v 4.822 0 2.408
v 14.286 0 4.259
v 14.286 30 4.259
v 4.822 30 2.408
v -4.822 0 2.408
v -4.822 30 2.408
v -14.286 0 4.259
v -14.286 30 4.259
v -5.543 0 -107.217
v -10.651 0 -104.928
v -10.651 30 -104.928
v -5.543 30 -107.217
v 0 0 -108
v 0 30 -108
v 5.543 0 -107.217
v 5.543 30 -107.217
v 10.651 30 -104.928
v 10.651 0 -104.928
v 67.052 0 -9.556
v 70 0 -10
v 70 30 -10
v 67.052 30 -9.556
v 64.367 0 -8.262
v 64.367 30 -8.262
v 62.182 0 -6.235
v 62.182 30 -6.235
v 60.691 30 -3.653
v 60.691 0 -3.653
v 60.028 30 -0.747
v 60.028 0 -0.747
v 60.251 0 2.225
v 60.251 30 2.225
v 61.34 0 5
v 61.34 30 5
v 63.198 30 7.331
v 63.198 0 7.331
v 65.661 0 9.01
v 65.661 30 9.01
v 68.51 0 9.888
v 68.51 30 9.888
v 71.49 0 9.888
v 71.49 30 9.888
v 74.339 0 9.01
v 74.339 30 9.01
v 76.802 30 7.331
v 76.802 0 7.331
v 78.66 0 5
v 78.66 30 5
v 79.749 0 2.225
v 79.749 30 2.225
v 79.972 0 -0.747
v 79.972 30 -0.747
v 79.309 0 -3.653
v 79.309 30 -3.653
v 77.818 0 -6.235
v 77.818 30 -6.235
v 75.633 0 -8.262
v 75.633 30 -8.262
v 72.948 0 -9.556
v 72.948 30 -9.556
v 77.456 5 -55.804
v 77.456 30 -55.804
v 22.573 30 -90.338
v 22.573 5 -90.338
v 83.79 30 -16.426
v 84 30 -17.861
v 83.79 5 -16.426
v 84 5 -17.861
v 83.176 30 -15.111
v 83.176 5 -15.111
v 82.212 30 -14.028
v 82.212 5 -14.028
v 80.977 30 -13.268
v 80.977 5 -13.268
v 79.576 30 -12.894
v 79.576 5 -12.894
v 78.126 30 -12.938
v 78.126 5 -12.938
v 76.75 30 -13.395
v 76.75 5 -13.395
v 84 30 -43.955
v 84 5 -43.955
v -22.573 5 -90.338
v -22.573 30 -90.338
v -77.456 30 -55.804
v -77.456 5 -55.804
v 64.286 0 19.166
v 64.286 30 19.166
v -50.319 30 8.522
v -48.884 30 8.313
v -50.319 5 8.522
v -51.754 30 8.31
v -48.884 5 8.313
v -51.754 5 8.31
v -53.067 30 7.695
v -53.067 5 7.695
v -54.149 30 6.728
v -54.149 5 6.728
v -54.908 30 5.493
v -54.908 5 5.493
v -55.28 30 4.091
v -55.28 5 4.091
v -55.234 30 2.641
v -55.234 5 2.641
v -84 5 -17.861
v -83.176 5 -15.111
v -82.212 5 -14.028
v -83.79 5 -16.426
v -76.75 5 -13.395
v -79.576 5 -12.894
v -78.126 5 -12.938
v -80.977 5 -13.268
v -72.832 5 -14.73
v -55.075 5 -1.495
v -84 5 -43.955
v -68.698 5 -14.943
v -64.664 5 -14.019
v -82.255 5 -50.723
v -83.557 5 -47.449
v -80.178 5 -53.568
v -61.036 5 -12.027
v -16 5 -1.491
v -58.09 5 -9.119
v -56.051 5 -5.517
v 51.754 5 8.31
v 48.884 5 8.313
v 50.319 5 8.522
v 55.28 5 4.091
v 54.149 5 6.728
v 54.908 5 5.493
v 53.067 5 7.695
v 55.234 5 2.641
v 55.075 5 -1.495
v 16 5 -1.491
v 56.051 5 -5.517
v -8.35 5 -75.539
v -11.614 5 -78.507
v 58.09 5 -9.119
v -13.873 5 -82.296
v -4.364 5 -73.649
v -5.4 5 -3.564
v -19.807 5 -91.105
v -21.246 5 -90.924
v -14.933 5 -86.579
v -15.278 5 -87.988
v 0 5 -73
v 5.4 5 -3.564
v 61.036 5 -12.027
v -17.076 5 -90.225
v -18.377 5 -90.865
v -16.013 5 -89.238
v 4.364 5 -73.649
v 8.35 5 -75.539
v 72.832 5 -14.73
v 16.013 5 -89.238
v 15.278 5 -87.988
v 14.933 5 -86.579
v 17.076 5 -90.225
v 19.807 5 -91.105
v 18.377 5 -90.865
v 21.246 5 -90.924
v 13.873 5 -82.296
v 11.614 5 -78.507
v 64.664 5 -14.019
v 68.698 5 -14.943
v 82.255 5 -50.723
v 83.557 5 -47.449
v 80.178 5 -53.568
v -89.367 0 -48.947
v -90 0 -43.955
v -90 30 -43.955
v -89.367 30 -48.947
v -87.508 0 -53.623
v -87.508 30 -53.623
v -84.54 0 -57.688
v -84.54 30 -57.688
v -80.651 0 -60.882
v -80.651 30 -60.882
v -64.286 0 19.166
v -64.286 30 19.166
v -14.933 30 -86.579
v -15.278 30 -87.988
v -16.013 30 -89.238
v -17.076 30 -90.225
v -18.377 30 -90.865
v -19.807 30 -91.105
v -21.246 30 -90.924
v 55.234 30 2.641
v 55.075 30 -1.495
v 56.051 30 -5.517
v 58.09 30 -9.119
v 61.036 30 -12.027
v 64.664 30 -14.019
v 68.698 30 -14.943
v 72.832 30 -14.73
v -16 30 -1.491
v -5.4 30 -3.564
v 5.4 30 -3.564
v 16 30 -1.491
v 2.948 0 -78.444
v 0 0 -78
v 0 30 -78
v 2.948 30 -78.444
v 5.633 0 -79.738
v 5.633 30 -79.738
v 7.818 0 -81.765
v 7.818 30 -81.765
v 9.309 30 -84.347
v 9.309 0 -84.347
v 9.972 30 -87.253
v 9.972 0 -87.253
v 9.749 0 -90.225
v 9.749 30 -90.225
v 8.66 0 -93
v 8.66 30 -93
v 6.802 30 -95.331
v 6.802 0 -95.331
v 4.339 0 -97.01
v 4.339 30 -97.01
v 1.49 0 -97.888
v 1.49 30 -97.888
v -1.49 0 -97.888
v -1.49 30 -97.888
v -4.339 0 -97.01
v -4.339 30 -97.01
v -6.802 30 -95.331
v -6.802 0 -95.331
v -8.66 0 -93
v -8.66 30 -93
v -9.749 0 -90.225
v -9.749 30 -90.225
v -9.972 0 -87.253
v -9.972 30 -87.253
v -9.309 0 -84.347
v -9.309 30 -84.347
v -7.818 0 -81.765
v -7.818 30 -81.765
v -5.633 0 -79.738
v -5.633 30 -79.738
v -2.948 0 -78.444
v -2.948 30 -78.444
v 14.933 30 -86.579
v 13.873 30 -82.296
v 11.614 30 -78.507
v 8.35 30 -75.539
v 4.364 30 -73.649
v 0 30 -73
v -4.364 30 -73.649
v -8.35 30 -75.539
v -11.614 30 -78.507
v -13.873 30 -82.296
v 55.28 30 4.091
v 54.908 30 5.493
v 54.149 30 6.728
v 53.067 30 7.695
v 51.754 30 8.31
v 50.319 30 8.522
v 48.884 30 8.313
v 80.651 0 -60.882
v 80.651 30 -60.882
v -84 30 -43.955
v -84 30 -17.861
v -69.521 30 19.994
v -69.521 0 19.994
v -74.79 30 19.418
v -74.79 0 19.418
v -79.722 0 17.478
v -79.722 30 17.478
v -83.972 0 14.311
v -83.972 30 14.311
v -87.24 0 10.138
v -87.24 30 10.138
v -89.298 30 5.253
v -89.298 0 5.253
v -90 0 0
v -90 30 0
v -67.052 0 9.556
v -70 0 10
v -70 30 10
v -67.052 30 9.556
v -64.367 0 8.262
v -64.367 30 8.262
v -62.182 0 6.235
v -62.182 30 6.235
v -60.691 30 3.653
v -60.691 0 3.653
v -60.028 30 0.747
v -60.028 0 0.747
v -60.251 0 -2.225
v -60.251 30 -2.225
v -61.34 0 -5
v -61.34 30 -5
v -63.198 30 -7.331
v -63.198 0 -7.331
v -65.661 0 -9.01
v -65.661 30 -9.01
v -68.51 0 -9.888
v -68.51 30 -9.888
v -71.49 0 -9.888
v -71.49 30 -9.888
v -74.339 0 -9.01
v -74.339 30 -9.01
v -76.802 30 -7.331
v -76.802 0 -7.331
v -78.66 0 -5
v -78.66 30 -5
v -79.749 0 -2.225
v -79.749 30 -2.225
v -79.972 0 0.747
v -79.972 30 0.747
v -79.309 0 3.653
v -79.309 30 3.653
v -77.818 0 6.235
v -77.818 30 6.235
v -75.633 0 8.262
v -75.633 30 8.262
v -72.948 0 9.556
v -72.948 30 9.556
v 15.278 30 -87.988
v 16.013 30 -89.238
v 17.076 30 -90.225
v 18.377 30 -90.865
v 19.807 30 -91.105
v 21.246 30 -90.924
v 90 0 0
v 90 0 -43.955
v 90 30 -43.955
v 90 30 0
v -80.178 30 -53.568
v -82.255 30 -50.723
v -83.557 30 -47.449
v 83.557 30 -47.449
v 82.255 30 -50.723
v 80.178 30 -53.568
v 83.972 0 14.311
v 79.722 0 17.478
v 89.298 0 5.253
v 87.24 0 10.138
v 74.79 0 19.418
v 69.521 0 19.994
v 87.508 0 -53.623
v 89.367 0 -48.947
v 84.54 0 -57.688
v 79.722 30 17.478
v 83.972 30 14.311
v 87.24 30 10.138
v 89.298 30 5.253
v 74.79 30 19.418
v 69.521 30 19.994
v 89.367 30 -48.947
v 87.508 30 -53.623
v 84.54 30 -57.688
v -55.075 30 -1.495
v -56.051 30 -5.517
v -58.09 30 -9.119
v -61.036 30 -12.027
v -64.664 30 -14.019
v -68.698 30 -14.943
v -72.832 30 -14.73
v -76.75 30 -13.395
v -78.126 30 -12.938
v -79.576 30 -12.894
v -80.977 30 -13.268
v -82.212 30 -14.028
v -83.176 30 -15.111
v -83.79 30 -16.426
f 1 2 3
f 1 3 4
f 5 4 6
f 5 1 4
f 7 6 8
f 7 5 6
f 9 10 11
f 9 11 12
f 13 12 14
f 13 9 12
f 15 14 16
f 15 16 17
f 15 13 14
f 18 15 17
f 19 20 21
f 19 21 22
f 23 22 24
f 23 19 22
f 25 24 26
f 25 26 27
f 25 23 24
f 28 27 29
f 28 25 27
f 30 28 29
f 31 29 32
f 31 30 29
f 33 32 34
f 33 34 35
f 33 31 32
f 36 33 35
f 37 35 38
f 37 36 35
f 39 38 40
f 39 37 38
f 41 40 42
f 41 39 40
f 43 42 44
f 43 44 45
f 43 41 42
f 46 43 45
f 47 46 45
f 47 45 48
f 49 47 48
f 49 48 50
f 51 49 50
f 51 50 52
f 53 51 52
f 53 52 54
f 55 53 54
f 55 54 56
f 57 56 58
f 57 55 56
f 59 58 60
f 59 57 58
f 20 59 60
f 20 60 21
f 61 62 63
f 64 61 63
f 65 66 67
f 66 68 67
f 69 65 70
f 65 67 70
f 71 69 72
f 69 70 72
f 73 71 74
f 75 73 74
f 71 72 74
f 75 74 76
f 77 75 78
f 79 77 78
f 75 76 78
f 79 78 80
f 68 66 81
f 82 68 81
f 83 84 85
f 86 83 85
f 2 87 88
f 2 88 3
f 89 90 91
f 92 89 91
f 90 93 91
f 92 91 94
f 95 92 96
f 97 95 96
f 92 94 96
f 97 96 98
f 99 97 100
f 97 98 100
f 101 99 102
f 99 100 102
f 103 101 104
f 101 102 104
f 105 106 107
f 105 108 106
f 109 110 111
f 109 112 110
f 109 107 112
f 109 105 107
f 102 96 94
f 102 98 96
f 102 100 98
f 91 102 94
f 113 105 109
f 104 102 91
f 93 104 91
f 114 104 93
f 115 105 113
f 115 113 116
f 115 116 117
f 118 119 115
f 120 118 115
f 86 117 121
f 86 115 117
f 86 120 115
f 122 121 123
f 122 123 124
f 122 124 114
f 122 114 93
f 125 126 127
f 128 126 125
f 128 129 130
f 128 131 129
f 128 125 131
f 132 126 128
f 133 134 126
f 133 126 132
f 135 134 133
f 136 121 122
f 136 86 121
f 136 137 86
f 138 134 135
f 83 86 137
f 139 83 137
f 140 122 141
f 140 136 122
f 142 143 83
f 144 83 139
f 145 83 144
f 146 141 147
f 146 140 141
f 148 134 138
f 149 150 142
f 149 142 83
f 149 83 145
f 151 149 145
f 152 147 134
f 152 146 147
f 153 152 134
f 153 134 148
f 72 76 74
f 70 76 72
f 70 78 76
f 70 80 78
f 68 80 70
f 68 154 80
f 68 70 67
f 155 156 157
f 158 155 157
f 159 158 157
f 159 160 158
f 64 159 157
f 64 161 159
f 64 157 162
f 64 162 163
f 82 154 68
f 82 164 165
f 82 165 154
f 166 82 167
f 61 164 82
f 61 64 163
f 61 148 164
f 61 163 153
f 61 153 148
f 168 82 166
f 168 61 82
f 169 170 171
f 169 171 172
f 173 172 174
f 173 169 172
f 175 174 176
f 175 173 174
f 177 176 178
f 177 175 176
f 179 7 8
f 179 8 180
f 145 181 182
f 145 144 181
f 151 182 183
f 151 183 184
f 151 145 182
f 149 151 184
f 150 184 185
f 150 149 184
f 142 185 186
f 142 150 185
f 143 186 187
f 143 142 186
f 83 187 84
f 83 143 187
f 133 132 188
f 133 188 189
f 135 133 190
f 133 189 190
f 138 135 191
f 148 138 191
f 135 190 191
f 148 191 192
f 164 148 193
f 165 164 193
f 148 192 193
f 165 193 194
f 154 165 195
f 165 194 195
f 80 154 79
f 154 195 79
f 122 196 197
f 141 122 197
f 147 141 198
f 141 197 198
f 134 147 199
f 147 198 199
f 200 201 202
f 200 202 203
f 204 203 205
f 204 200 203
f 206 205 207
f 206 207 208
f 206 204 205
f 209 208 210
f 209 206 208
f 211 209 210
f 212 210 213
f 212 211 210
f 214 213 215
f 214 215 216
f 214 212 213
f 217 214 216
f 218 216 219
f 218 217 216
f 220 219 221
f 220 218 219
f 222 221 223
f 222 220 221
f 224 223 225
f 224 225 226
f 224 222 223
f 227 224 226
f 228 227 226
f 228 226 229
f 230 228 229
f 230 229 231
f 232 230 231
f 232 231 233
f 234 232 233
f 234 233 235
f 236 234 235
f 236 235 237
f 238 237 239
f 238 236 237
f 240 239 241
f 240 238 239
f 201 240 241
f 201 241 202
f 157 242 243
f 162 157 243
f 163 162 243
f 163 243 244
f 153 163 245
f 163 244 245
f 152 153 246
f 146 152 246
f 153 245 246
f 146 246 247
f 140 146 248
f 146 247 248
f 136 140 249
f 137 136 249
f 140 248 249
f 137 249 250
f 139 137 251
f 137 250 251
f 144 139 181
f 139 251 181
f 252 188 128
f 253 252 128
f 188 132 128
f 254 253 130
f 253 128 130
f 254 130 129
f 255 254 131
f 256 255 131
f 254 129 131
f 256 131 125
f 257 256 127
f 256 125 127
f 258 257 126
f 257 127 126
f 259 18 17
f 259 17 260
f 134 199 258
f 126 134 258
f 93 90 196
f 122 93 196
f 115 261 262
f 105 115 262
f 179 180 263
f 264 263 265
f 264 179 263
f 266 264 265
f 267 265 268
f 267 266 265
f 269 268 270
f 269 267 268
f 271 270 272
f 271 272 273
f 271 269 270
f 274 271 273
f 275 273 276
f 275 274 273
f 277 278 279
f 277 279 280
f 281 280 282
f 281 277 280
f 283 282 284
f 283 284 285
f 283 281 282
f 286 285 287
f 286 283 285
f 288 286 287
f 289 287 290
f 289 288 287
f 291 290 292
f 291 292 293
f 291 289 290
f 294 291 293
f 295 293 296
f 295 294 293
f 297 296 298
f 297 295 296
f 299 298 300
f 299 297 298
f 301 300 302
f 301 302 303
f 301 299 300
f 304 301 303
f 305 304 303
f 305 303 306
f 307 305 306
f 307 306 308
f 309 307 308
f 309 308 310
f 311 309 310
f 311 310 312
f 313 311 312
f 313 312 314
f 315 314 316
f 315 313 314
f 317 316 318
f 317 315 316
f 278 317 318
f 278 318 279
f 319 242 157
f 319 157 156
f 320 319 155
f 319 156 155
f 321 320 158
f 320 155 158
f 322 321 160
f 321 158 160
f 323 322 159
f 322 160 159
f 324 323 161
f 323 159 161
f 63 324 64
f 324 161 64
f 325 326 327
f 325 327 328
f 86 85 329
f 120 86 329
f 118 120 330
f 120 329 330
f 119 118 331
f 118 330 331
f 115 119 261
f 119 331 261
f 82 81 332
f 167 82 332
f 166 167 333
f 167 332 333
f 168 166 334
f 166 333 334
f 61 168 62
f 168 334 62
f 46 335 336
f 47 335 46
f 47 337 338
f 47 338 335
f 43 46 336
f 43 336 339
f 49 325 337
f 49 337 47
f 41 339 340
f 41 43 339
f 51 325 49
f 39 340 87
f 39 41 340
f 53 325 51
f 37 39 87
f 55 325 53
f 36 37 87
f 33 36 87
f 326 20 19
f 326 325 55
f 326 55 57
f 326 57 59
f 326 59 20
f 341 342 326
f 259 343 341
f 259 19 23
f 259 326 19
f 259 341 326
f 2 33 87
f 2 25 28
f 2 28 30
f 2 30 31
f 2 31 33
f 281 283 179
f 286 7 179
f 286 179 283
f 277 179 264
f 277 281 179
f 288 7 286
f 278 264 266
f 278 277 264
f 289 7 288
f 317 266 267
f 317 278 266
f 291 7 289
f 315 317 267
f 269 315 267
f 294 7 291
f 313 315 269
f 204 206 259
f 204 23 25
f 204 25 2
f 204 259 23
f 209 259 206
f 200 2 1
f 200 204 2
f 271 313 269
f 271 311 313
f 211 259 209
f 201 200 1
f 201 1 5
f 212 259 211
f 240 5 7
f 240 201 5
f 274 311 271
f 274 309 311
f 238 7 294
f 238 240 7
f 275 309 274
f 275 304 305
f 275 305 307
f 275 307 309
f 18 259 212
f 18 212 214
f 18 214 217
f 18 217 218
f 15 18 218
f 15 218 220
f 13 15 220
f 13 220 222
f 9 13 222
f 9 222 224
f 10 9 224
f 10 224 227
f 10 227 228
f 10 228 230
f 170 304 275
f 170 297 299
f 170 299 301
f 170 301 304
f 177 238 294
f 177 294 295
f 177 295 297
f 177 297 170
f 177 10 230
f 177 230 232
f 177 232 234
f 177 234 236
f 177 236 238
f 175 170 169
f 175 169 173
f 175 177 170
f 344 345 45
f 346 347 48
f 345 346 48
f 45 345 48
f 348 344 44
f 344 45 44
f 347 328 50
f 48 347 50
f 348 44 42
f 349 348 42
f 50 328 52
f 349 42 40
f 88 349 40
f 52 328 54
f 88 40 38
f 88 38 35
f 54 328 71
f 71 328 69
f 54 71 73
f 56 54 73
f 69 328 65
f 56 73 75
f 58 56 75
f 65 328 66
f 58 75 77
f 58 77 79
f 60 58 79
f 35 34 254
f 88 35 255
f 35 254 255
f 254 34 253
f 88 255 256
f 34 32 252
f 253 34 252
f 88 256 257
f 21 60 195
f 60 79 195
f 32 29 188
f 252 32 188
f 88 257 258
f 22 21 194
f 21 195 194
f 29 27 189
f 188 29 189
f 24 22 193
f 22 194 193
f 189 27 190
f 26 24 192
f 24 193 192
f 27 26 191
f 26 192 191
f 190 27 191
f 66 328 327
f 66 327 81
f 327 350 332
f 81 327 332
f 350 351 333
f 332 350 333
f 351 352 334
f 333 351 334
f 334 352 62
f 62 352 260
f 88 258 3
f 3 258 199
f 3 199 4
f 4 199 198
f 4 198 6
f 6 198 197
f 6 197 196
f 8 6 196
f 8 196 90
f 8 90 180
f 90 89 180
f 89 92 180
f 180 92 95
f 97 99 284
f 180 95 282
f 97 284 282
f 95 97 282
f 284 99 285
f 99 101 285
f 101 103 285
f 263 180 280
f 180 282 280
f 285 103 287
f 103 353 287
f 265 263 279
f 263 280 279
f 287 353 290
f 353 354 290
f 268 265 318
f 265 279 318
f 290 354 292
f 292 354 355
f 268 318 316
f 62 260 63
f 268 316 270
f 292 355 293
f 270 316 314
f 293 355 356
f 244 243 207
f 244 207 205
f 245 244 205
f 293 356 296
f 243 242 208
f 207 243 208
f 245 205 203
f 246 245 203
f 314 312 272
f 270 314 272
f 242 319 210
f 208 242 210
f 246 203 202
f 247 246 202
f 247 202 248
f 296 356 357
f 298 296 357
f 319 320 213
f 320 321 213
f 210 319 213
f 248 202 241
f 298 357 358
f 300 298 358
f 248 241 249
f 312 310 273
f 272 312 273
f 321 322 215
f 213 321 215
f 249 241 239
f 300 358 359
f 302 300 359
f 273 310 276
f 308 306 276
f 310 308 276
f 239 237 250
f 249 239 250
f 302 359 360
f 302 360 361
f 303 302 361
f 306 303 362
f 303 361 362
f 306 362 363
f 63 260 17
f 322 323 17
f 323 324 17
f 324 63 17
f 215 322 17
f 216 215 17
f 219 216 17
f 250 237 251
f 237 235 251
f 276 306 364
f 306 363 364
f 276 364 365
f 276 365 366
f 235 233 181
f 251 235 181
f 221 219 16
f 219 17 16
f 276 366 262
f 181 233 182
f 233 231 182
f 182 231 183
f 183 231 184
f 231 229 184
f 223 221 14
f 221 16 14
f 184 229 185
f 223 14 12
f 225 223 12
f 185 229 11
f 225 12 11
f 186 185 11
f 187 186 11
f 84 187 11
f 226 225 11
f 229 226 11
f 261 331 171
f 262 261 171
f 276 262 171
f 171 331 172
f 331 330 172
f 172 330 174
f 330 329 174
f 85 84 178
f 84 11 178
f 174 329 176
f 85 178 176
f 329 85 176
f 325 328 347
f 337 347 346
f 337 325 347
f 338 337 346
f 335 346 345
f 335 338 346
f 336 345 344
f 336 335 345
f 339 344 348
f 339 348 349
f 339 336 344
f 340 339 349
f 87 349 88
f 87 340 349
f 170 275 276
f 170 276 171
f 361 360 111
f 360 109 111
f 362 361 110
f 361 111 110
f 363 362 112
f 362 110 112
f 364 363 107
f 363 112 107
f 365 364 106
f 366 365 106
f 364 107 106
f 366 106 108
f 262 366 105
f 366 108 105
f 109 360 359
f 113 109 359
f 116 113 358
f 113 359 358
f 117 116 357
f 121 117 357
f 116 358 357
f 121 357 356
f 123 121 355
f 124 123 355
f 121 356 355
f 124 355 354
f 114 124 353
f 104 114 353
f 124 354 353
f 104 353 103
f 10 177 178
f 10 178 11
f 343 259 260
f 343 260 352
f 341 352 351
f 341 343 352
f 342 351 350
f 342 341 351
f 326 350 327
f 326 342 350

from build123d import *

# Parameters (mm, degrees)
SKETCH1_R           = 10
BOSS_EXTRUDE1_DEPTH = 30
CUT_EXTRUDE1_DEPTH  = 25
FILLET1_R           = 5


with BuildPart() as part:
    # Sketch1 → Boss-Extrude1 (new body)
    with BuildSketch(Plane(origin=(0, 0, 0), x_dir=(1, 0, 0), z_dir=(0, 1, 0))):
        with BuildLine():
            Line((-90, 0), (-90, 43.954606061))
            ThreePointArc((-90, 43.954606061), (-87.507512185, 53.62347451), (-80.651298291, 60.88238928))
            Line((-80.651298291, 60.88238928), (-10.651298291, 104.927783219))
            ThreePointArc((-10.651298291, 104.927783219), (0, 108), (10.651298291, 104.927783219))
            Line((10.651298291, 104.927783219), (80.651298291, 60.88238928))
            ThreePointArc((80.651298291, 60.88238928), (87.507512185, 53.62347451), (90, 43.954606061))
            Line((90, 43.954606061), (90, 0))
            ThreePointArc((90, 0), (81.952286093, -16.035674515), (64.285714286, -19.16629695))
            Line((64.285714286, -19.16629695), (14.285714286, -4.2591771))
            ThreePointArc((14.285714286, -4.2591771), (0, -2.174919475), (-14.285714286, -4.2591771))
            Line((-14.285714286, -4.2591771), (-64.285714286, -19.16629695))
            ThreePointArc((-64.285714286, -19.16629695), (-81.952286093, -16.035674515), (-90, 0))
        make_face()
        with Locations(Location((0, 88, 0), (0, 0, 270))):
            Circle(SKETCH1_R, mode=Mode.SUBTRACT)
        with Locations(Location((-70, 0, 0), (0, 0, 270))):
            Circle(SKETCH1_R, mode=Mode.SUBTRACT)
        with Locations(Location((70, 0, 0), (0, 0, 90))):
            Circle(SKETCH1_R, mode=Mode.SUBTRACT)
    extrude(amount=BOSS_EXTRUDE1_DEPTH)

    # Sketch2 → Cut-Extrude1 (cut)
    with BuildSketch(Plane(origin=(0, 30, 0), x_dir=(1, 0, 0), z_dir=(0, 1, 0))):
        with BuildLine():
            Line((-12.013853927, 96.981498418), (-77.455908804, 55.804054314))
            ThreePointArc((-77.455908804, 55.804054314), (-82.25525853, 50.722813975), (-84, 43.954606061))
            Line((-84, 43.954606061), (-84, 5.385164807))
            ThreePointArc((-84, 5.385164807), (-61.03578543, 12.026755886), (-60.839316609, -11.877789349))
            Line((-60.839316609, -11.877789349), (-16, 1.490711985))
            ThreePointArc((-16, 1.490711985), (0, 3.825080525), (16, 1.490711985))
            Line((16, 1.490711985), (60.839316609, -11.877789349))
            ThreePointArc((60.839316609, -11.877789349), (61.03578543, 12.026755886), (84, 5.385164807))
            Line((84, 5.385164807), (84, 43.954606061))
            ThreePointArc((84, 43.954606061), (82.25525853, 50.722813975), (77.455908804, 55.804054314))
            Line((77.455908804, 55.804054314), (12.013853927, 96.981498418))
            ThreePointArc((12.013853927, 96.981498418), (0, 73), (-12.013853927, 96.981498418))
        make_face()
    extrude(amount=-CUT_EXTRUDE1_DEPTH, mode=Mode.SUBTRACT)

    # Fillet1
    fillet1_edges = [part.edges().sort_by_distance(p)[0] for p in [
        (84, 17.5, -5.385164807),
        (60.839316609, 17.5, 11.877789349),
        (-60.839316609, 17.5, 11.877789349),
        (-84, 17.5, -5.385164807),
        (-12.013853927, 17.5, -96.981498418),
        (12.013853927, 17.5, -96.981498418),
    ]]
    fillet(fillet1_edges, radius=FILLET1_R)


solid = part.part
